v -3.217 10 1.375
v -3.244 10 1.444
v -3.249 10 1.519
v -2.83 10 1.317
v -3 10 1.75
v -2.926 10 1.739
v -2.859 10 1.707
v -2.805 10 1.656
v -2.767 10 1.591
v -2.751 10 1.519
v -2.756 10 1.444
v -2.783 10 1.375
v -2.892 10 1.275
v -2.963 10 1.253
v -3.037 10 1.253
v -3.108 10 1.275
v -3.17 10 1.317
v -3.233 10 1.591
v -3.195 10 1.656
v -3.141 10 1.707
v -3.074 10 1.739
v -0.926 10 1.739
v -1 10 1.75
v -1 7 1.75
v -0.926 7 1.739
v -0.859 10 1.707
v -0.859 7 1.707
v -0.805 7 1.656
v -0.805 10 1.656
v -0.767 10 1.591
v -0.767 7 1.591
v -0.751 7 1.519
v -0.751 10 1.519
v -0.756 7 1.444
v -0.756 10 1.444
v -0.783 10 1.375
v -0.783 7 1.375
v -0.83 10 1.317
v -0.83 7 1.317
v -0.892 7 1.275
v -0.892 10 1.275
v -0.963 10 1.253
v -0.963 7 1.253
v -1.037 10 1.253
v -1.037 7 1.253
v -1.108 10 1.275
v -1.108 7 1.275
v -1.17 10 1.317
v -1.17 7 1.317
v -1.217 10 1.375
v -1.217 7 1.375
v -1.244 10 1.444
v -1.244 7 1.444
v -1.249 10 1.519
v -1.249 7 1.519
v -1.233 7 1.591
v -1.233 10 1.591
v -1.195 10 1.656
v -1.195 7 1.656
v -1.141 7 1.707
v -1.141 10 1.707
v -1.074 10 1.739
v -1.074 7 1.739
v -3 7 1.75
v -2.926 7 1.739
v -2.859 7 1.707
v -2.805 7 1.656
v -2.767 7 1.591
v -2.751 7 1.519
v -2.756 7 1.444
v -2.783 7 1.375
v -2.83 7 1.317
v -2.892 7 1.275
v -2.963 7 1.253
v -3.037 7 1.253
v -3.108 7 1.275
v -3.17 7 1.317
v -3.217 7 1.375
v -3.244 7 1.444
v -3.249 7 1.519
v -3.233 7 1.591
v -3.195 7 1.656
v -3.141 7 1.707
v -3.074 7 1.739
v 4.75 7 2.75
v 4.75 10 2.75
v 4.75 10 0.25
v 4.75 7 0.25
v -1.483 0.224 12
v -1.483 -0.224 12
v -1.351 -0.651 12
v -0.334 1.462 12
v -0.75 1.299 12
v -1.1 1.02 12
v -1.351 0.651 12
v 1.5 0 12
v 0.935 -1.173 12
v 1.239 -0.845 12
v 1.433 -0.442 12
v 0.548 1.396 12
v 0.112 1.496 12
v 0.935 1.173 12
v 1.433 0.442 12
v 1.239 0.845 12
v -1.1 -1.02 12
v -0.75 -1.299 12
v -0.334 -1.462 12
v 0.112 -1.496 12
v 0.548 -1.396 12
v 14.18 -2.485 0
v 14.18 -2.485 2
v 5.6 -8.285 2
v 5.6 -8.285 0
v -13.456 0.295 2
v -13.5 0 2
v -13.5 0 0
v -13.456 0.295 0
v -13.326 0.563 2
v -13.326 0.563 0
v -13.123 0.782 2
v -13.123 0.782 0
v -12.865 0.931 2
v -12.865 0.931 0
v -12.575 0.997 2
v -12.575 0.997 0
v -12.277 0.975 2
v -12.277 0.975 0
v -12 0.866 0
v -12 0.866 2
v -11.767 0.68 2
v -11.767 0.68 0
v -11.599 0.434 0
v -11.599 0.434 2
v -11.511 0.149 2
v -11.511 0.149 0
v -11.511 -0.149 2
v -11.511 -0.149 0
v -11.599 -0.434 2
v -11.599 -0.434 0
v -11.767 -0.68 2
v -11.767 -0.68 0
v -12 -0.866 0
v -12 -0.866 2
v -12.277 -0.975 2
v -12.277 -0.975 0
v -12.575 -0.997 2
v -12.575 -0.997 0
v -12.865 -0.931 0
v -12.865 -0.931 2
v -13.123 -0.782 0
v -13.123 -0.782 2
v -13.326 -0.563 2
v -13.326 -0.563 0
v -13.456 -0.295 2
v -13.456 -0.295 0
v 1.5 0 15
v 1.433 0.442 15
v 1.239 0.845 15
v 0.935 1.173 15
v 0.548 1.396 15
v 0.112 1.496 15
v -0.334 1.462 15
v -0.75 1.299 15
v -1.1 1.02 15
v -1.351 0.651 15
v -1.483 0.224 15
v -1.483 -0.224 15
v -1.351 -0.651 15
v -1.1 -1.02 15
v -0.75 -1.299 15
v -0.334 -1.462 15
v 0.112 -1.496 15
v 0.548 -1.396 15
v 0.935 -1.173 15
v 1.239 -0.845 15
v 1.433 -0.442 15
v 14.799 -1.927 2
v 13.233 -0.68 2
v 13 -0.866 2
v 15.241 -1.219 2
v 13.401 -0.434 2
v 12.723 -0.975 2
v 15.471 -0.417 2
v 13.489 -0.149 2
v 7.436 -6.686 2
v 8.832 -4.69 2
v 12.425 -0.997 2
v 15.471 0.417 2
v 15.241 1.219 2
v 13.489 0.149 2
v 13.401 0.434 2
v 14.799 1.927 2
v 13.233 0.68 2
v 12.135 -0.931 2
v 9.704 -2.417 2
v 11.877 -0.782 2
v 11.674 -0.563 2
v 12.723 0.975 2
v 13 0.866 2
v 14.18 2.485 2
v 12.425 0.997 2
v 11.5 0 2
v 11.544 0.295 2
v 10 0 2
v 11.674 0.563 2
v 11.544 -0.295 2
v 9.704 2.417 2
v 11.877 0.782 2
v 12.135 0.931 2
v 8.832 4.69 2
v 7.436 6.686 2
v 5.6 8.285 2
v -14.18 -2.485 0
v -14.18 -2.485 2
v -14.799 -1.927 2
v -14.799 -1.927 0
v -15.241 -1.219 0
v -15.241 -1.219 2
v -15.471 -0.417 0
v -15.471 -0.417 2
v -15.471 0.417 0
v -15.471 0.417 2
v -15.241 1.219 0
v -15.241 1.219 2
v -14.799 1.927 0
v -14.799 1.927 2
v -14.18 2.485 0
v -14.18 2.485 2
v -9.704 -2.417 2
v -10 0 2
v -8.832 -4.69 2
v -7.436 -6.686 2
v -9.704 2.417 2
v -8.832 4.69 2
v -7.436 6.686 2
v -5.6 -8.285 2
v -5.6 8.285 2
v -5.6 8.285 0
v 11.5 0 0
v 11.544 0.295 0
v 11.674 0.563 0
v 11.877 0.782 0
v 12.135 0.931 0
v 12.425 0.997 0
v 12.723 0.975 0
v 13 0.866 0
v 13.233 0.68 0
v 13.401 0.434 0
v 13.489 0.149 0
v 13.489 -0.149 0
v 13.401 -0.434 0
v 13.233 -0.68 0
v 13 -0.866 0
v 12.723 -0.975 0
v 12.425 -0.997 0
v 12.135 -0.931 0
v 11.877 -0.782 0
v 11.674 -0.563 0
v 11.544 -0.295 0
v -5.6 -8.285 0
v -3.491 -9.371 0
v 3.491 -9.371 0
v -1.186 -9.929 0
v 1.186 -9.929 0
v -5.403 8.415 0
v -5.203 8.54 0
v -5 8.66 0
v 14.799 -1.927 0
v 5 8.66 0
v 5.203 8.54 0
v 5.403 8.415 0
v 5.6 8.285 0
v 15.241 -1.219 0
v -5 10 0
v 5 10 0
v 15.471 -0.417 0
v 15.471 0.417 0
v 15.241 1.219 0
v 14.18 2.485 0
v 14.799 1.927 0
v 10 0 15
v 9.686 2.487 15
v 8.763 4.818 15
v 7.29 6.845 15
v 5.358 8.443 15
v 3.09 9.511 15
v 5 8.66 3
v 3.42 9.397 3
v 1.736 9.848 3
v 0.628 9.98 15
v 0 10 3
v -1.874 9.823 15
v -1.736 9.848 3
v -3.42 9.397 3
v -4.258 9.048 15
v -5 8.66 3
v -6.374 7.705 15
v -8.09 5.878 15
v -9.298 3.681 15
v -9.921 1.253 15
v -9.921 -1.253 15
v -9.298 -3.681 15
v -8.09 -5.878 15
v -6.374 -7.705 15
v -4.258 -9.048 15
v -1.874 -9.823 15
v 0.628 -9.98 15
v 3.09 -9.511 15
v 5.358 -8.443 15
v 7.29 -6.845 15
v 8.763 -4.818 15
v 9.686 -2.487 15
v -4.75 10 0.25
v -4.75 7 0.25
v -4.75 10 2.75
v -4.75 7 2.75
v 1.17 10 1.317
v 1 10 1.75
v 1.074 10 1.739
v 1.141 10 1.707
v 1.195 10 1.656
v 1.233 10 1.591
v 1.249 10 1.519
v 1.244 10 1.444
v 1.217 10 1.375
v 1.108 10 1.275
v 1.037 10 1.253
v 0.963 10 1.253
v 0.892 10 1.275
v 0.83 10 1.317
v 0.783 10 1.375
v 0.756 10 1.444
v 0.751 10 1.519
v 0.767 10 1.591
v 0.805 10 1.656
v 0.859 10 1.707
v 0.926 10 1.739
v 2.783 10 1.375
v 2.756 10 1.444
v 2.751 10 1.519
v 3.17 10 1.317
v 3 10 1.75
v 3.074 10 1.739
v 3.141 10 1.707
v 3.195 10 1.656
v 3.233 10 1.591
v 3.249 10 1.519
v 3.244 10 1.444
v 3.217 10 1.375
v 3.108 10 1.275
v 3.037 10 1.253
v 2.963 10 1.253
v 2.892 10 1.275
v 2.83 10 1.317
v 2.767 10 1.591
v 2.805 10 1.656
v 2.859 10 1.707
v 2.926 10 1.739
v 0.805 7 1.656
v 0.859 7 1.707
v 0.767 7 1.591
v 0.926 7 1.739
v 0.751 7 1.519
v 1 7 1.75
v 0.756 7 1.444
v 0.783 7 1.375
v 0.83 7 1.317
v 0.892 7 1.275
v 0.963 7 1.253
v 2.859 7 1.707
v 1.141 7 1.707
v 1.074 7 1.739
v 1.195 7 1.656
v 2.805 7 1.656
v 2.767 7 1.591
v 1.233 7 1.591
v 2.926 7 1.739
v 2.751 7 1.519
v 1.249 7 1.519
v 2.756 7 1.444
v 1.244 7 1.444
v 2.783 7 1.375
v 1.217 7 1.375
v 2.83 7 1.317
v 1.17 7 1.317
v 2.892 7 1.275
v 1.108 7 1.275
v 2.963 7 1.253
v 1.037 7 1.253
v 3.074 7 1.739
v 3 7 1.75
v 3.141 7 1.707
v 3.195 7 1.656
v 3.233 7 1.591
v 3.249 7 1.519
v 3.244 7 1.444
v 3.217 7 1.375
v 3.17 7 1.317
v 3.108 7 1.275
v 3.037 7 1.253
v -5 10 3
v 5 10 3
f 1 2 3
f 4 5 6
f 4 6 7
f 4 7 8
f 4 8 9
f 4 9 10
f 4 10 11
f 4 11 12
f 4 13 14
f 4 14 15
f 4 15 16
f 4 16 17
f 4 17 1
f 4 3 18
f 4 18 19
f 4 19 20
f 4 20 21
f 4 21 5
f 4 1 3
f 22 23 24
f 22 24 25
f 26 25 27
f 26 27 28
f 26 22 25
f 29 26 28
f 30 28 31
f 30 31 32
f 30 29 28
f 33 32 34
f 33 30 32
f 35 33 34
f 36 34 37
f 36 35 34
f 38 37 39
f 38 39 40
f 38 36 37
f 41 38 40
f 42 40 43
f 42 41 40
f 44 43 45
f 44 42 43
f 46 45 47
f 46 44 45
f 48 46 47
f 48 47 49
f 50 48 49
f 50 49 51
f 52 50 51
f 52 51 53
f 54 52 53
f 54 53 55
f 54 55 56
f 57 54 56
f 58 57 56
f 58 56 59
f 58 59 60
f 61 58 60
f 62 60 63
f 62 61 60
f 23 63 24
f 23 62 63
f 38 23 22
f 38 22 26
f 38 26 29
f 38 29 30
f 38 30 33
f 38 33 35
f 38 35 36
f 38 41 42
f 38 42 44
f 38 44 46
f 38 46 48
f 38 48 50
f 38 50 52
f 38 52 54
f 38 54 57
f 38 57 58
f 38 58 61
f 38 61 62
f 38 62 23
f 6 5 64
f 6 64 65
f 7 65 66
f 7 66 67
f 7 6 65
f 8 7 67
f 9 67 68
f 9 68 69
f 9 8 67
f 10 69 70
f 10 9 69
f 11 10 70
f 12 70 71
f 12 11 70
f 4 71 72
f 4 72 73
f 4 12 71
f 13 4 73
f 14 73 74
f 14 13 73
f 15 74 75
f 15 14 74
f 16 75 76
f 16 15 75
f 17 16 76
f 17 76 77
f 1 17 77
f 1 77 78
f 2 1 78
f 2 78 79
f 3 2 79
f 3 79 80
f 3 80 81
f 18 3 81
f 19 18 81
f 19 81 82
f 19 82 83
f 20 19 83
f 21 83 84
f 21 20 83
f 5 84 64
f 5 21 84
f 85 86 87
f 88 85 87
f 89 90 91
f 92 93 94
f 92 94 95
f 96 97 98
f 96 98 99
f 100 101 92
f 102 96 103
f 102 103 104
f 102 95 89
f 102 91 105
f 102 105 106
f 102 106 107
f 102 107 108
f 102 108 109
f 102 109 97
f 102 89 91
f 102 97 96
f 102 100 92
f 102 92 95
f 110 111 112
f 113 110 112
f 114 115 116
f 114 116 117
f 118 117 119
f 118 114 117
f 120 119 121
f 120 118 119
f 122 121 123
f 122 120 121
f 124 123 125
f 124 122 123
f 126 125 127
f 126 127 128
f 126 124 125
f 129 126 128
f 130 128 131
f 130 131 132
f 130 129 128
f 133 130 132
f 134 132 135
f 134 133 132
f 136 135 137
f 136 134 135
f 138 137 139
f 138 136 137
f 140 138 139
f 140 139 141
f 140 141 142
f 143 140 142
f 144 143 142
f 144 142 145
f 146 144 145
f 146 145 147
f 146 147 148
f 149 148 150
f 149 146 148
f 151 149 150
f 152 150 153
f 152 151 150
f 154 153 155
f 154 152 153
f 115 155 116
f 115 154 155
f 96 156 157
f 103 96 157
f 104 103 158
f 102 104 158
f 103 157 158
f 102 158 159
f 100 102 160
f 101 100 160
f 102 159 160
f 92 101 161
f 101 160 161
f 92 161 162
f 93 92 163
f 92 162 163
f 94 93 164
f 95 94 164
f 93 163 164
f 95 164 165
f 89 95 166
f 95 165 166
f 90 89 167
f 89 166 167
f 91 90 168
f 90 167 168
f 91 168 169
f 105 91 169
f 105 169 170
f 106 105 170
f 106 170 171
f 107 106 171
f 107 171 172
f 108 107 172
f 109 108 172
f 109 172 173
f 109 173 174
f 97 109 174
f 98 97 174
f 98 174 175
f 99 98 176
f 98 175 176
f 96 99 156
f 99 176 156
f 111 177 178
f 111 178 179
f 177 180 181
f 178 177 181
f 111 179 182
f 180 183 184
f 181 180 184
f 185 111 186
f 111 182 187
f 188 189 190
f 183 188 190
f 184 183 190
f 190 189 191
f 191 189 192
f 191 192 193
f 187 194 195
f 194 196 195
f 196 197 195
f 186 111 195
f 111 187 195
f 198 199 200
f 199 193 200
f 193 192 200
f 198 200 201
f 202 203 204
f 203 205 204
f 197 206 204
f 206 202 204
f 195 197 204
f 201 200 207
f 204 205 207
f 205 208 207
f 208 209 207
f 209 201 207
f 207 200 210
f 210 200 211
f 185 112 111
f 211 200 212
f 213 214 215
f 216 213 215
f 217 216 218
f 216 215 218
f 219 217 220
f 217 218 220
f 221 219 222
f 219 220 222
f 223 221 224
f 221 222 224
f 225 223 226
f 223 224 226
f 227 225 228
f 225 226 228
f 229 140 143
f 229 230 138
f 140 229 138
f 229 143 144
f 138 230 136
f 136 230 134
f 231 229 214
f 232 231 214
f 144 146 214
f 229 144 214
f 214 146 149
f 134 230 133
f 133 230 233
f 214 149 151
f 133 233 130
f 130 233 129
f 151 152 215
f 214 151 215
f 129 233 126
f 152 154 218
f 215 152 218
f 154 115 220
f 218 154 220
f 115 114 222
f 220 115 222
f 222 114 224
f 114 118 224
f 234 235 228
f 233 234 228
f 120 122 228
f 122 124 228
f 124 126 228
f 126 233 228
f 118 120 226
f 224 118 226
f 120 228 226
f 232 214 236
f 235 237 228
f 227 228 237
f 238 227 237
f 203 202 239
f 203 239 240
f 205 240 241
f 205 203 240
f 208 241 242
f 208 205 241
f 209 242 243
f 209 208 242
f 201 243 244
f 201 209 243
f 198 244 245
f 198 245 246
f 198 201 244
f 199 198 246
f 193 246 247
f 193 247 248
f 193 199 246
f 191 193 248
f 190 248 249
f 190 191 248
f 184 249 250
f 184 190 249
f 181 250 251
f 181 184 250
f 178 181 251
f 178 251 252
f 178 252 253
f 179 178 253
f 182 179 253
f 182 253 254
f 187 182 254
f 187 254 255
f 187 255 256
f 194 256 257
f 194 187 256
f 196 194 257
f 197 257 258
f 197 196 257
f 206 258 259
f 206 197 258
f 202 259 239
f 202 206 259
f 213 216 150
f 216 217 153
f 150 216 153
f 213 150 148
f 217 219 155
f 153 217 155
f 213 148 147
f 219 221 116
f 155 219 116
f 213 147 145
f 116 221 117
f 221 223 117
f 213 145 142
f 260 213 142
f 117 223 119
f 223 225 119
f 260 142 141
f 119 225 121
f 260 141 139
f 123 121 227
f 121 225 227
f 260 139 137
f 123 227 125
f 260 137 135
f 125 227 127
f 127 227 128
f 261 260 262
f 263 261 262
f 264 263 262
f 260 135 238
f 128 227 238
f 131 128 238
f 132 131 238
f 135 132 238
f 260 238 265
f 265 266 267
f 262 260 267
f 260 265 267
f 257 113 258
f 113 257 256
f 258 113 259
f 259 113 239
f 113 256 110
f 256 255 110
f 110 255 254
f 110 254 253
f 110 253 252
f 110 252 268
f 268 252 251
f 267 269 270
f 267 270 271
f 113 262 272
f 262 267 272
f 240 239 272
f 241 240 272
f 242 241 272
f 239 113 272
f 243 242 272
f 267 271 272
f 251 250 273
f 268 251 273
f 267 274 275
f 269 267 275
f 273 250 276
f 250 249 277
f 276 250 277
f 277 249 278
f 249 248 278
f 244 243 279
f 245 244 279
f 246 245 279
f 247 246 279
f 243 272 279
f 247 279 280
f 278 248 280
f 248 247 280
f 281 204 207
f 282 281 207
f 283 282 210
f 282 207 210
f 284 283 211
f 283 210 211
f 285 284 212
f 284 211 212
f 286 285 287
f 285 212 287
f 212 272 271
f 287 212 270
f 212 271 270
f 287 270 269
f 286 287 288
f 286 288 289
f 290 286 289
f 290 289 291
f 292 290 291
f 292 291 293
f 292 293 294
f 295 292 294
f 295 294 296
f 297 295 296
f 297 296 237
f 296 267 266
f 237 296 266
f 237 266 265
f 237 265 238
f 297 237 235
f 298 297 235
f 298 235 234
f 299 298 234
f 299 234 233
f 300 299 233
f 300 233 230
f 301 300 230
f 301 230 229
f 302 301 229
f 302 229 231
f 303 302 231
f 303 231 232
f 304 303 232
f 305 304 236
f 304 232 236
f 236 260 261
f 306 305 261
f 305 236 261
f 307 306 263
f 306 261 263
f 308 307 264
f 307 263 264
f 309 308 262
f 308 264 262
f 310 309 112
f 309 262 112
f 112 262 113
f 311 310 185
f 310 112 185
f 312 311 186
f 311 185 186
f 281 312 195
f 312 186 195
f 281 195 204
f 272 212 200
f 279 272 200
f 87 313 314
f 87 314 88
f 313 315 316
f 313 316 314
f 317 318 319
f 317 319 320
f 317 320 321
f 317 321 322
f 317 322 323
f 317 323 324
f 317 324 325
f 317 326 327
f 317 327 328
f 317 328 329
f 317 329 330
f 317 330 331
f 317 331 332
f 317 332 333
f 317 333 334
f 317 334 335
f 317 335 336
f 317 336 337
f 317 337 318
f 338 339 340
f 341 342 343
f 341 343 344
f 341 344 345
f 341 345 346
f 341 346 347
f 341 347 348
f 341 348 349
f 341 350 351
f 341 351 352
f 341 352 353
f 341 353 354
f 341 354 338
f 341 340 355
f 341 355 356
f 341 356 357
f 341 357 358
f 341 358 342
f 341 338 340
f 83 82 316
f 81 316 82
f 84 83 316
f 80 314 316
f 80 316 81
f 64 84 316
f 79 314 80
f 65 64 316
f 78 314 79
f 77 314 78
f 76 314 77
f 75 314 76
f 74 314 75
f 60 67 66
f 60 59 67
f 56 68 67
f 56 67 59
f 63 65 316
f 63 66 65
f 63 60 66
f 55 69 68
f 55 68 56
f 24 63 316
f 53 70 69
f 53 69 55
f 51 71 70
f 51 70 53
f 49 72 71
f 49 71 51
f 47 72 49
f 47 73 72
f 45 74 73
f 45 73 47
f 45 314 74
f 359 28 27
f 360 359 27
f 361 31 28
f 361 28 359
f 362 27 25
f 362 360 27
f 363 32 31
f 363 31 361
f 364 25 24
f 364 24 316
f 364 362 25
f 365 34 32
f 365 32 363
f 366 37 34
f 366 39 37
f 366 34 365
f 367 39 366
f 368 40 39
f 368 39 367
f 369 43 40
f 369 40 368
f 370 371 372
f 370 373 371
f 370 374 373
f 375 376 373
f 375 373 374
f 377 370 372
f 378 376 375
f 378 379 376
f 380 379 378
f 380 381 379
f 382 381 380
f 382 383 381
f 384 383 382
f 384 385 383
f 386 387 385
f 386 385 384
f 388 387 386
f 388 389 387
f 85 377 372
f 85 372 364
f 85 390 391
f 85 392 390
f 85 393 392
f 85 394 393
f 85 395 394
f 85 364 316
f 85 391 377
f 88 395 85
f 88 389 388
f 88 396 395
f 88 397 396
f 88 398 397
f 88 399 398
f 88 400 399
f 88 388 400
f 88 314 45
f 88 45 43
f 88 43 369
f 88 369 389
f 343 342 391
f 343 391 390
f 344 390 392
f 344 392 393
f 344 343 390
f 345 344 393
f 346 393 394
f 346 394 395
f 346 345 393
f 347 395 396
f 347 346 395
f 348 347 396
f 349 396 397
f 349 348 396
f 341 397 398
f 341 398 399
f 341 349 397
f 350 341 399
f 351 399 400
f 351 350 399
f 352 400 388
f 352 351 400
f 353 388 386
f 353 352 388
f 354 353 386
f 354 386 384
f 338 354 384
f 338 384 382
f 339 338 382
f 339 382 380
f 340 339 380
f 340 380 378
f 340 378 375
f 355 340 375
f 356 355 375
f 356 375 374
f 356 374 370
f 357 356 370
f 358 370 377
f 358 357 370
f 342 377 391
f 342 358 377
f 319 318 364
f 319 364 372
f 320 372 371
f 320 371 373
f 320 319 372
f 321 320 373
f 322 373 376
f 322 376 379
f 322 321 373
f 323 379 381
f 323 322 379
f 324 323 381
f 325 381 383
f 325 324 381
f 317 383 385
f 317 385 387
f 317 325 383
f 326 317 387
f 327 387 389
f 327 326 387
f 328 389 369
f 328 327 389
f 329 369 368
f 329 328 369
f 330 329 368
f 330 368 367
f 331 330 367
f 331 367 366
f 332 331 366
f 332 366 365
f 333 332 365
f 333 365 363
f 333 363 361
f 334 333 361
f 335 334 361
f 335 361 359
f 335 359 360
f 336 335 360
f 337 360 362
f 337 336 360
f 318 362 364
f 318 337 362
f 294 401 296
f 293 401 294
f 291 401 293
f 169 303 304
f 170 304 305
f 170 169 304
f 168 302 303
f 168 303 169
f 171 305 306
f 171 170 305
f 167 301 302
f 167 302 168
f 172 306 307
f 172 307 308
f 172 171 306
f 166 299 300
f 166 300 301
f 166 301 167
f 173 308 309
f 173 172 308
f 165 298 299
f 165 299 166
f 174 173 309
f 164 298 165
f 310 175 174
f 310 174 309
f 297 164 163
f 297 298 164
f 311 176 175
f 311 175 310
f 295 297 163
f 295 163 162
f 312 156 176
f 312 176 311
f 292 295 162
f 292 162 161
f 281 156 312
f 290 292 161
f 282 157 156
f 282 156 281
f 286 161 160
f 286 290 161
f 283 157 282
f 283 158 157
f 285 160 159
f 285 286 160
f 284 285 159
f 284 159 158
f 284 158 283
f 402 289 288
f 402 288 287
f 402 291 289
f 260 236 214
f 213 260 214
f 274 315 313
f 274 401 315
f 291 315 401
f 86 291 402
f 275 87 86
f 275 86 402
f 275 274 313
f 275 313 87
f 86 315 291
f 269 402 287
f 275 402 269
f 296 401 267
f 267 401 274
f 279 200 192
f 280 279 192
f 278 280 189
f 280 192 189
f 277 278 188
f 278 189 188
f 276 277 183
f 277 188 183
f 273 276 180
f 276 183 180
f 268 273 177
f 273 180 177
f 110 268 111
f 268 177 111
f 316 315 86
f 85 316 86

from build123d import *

# Parameters (mm, degrees)
SKETCH1_R               = 10
BOSS_EXTRUDE1_DEPTH     = 15
BOSS_EXTRUDE2_START     = -2
BOSS_EXTRUDE2_OUTLINE_R = 1
BOSS_EXTRUDE2_DEPTH     = 2
SKETCH3_W               = 10
SKETCH3_H               = 3
BOSS_EXTRUDE3_DEPTH     = 2
SKETCH4_W               = 9.5
SKETCH4_H               = 2.5
SKETCH4_R               = 0.25
CUT_EXTRUDE1_DEPTH      = 3
SKETCH5_R               = 1.5
CUT_EXTRUDE2_DEPTH      = 3


# Read off the part's stored shape, not the designer's step: Boss-Extrude2
with BuildPart() as part:
    # Sketch1 → Boss-Extrude1 (new body)
    with BuildSketch(Plane.XY):
        Circle(SKETCH1_R)
    extrude(amount=BOSS_EXTRUDE1_DEPTH)

    # Boss-Extrude2 outline → Boss-Extrude2 (add)
    # profile 1 of 2: a face of its own
    with BuildSketch(Plane(origin=(0, 0, 0), x_dir=(-1, 0, 0), z_dir=(0, 0, -1)).offset(BOSS_EXTRUDE2_START)):
        with BuildLine():
            Line((5.599999975, -8.284926088), (14.179999754, -2.485477473))
            ThreePointArc((14.179999754, -2.485477473), (15.499999574, 0), (14.179999754, 2.485477473))
            Line((14.179999754, 2.485477473), (5.599999975, 8.284926088))
            ThreePointArc((5.599999975, 8.284926088), (10, 0), (5.599999975, -8.284926088))
        make_face()
        with Locations((12.5, 0)):
            Circle(BOSS_EXTRUDE2_OUTLINE_R, mode=Mode.SUBTRACT)
    # profile 2 of 2: a face of its own
    with BuildSketch(Plane(origin=(0, 0, 0), x_dir=(-1, 0, 0), z_dir=(0, 0, -1)).offset(BOSS_EXTRUDE2_START)):
        with BuildLine():
            Line((-14.179999754, -2.485477473), (-5.599999975, -8.284926088))
            ThreePointArc((-5.599999975, -8.284926088), (-10, 0), (-5.599999975, 8.284926088))
            Line((-5.599999975, 8.284926088), (-14.179999754, 2.485477473))
            ThreePointArc((-14.179999754, 2.485477473), (-15.499999574, 0), (-14.179999754, -2.485477473))
        make_face()
        with Locations((-12.5, 0)):
            Circle(BOSS_EXTRUDE2_OUTLINE_R, mode=Mode.SUBTRACT)
    extrude(amount=BOSS_EXTRUDE2_DEPTH)

    # Sketch3 → Boss-Extrude3 (add)
    with BuildSketch(Plane(origin=(0, 10, 0), x_dir=(1, 0, 0), z_dir=(0, 1, 0))):
        with Locations((0, -1.5)):
            Rectangle(SKETCH3_W, SKETCH3_H)
    extrude(amount=-BOSS_EXTRUDE3_DEPTH)

    # Sketch4 → Cut-Extrude1 (cut)
    with BuildSketch(Plane(origin=(0, 10, 0), x_dir=(1, 0, 0), z_dir=(0, 1, 0))):
        with Locations((0, -1.5)):
            Rectangle(SKETCH4_W, SKETCH4_H)
        with Locations(Location((-3, -1.5, 0), (0, 0, 270))):
            Circle(SKETCH4_R, mode=Mode.SUBTRACT)
        with Locations(Location((-1, -1.5, 0), (0, 0, 270))):
            Circle(SKETCH4_R, mode=Mode.SUBTRACT)
        with Locations(Location((1, -1.5, 0), (0, 0, 270))):
            Circle(SKETCH4_R, mode=Mode.SUBTRACT)
        with Locations(Location((3, -1.5, 0), (0, 0, 270))):
            Circle(SKETCH4_R, mode=Mode.SUBTRACT)
    extrude(amount=-CUT_EXTRUDE1_DEPTH, mode=Mode.SUBTRACT)

    # Sketch5 → Cut-Extrude2 (cut)
    with BuildSketch(Plane.XY.offset(15)):
        Circle(SKETCH5_R)
    extrude(amount=-CUT_EXTRUDE2_DEPTH, mode=Mode.SUBTRACT)


solid = part.part
